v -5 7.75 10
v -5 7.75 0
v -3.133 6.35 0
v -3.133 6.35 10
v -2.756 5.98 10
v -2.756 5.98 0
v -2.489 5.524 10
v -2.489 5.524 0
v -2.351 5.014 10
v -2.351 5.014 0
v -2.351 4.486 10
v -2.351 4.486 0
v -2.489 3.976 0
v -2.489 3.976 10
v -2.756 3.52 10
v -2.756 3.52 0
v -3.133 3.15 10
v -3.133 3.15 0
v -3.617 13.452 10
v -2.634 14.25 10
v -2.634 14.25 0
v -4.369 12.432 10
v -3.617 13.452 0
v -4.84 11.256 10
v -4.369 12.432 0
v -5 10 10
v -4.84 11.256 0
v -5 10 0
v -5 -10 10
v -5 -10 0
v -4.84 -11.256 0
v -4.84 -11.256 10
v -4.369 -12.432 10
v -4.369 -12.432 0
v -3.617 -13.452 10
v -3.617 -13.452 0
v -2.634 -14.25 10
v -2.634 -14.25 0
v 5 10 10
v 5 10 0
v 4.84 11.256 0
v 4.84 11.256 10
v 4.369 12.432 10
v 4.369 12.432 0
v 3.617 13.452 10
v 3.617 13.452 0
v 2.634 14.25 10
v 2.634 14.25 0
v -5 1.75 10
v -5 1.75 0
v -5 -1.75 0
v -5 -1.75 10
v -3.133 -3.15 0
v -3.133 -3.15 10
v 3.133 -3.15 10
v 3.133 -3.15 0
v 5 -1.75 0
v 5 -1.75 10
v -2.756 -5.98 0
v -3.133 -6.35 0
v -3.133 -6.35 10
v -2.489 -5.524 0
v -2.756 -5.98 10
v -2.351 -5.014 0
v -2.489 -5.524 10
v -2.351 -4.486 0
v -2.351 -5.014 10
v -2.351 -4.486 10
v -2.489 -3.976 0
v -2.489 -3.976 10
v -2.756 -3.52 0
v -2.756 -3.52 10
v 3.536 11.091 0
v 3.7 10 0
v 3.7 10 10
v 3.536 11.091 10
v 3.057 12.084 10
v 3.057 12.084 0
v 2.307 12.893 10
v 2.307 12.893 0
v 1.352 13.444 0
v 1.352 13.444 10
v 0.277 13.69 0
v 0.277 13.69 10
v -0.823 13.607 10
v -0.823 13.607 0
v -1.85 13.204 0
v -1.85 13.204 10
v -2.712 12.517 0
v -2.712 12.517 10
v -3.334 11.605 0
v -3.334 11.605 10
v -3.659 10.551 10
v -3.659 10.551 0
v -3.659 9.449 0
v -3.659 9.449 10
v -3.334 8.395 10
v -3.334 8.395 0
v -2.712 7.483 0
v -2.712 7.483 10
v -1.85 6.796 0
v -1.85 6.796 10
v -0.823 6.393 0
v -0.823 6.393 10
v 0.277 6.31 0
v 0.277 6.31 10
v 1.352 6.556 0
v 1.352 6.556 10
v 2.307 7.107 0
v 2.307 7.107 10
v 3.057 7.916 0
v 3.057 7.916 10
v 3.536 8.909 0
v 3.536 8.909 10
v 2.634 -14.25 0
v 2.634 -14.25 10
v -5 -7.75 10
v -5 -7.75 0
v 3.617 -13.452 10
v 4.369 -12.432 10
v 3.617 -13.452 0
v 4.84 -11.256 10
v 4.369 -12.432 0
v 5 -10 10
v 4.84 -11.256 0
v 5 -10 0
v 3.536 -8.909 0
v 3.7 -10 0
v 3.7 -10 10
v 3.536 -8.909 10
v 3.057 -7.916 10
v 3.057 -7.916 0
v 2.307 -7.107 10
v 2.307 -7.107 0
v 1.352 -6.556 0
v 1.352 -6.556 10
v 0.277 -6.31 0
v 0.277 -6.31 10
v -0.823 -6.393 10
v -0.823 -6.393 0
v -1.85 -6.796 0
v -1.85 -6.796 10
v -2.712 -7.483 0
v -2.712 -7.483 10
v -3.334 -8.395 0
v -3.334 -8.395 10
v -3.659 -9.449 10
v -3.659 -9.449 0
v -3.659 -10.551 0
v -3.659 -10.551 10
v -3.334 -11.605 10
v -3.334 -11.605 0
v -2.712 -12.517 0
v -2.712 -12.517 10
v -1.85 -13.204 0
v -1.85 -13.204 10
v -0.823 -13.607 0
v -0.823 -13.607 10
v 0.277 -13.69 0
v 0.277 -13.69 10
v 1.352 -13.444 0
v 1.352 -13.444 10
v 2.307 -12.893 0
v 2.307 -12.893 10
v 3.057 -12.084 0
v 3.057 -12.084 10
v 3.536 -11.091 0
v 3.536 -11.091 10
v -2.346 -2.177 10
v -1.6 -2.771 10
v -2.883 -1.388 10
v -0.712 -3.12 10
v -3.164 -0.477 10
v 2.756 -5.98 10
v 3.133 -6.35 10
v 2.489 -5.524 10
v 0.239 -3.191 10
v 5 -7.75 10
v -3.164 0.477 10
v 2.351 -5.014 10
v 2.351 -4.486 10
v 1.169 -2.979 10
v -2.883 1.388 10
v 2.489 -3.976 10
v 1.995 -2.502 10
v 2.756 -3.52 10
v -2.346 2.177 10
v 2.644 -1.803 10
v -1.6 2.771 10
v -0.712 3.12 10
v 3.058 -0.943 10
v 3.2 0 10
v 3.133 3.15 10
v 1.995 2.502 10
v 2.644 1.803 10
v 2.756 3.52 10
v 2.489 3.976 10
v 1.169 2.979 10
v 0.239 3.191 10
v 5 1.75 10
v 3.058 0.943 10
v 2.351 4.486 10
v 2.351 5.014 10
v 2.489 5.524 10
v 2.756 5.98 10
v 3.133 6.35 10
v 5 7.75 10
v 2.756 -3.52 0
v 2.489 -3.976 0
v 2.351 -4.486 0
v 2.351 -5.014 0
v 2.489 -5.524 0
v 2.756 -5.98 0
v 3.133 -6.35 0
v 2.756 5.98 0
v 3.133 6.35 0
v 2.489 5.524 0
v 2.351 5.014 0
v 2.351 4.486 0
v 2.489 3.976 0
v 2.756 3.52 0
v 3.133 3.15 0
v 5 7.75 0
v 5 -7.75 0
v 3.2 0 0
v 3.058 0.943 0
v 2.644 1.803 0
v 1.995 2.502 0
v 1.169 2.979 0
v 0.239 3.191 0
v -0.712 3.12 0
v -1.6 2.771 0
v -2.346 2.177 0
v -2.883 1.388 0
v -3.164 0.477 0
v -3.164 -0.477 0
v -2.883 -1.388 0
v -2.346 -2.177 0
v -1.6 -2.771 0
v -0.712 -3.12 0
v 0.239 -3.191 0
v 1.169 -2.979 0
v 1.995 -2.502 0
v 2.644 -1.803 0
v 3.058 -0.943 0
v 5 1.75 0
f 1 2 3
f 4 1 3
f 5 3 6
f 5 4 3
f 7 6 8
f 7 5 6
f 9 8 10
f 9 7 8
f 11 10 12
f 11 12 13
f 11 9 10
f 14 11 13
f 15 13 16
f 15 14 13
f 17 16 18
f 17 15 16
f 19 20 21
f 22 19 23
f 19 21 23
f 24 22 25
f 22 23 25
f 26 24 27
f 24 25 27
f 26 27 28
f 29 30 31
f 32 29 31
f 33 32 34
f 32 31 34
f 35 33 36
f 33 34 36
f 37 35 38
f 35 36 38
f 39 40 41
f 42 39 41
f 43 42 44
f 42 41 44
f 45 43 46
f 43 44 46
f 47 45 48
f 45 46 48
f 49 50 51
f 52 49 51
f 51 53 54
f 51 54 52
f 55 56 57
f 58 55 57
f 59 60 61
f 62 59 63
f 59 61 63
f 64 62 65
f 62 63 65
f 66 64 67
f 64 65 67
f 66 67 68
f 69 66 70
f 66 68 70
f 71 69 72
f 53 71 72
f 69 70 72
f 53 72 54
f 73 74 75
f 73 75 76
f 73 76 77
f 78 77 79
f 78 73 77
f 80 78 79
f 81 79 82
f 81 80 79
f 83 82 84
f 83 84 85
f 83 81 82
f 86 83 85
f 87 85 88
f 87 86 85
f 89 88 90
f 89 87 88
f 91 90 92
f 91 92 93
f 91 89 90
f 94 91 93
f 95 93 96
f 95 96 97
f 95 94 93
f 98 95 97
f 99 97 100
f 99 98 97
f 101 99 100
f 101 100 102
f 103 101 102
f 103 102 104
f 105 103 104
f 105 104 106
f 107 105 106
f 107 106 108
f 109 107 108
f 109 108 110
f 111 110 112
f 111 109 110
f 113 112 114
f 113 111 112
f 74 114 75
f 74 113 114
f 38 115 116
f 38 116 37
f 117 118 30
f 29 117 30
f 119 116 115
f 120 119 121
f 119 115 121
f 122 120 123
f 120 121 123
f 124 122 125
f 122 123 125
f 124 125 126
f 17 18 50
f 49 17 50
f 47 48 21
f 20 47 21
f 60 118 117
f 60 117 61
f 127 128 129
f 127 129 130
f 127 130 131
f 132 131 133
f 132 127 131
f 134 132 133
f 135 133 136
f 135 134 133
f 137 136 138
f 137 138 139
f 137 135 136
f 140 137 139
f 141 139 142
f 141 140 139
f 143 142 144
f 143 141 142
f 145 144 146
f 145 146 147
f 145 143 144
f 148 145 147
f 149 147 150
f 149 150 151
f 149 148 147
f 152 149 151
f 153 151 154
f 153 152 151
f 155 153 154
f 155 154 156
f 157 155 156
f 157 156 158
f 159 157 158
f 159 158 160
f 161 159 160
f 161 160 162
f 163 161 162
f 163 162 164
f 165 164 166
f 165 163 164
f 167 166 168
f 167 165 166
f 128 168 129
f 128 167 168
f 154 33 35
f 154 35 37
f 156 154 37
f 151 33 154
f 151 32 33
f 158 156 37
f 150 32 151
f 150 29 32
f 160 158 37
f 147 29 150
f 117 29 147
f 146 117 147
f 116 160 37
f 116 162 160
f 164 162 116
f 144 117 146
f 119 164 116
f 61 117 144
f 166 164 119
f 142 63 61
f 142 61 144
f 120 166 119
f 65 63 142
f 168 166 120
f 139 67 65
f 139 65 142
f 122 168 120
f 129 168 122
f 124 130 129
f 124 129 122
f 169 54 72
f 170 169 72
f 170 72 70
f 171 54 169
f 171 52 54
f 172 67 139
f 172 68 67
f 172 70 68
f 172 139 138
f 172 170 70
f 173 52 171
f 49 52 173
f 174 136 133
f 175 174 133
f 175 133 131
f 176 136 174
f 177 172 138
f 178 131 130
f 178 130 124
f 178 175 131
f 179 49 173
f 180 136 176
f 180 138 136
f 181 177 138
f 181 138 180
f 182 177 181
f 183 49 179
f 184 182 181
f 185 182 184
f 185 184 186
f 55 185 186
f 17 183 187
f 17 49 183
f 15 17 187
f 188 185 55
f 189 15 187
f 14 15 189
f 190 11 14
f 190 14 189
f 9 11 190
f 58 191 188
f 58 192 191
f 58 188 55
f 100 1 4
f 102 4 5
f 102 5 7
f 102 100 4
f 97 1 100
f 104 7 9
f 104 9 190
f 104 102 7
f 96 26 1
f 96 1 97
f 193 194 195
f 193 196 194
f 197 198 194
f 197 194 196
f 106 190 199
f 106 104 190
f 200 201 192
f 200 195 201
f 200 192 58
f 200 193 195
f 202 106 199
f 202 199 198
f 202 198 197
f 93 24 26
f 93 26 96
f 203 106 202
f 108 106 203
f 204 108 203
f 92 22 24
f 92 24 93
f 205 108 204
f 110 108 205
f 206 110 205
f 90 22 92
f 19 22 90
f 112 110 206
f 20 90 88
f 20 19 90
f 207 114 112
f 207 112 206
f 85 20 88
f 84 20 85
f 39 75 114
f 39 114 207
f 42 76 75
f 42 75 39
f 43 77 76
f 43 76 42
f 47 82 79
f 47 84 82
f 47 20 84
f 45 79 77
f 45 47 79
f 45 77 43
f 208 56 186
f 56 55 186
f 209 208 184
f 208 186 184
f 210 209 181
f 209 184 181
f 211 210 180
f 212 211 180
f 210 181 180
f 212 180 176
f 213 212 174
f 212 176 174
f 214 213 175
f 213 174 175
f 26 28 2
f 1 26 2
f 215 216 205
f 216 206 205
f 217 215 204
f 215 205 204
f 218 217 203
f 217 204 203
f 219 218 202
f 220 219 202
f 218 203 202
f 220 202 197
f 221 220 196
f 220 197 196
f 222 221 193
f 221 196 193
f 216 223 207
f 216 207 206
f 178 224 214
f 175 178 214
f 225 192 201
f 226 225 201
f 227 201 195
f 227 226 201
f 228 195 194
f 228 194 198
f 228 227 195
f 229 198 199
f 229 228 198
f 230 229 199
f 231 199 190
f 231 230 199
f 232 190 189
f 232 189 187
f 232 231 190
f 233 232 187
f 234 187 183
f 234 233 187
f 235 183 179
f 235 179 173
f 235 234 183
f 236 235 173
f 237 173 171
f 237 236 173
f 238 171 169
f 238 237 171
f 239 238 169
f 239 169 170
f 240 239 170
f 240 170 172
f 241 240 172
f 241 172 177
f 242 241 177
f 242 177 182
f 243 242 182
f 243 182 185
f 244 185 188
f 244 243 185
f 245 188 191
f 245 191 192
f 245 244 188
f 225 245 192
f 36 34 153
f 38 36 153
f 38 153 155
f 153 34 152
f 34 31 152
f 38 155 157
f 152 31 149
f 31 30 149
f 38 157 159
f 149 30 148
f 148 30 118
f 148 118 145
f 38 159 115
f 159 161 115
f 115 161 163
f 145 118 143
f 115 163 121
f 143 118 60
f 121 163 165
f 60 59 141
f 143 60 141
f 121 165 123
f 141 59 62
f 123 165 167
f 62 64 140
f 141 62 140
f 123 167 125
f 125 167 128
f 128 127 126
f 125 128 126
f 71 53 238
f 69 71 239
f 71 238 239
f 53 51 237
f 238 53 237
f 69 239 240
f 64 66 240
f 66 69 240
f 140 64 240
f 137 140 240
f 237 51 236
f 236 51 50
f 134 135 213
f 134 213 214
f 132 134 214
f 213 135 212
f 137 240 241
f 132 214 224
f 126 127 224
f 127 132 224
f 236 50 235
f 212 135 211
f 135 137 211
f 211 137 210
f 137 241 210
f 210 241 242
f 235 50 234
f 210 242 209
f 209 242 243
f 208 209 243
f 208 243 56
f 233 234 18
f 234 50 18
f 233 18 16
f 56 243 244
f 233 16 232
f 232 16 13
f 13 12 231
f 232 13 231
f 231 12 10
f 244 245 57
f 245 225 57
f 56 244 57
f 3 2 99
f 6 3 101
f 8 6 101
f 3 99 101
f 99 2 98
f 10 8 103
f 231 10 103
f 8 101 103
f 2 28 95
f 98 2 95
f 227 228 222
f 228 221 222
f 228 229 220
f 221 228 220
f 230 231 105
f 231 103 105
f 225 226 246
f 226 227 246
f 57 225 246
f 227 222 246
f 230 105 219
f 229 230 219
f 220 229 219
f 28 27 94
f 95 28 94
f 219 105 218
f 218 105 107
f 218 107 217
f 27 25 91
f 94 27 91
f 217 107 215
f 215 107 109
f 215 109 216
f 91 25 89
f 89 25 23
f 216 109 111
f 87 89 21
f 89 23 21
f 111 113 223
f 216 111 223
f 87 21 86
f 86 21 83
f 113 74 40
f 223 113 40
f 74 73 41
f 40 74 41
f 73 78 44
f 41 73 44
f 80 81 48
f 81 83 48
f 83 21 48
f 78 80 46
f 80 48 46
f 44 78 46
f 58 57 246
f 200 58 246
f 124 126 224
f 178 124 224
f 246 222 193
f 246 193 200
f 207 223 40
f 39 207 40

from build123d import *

# Parameters (mm, degrees)
ESQUISSE1_R             = 3.7
ESQUISSE1_R_2           = 3.2
BOSS_EXTRU_1_DEPTH      = 10
ENL_V_START             = -10
ENL_V_MAT_EXTRU_1_DEPTH = 29.708286934
SYM_TRIE2_START         = -10
SYM_TRIE2_COPY_1_DEPTH  = 29.708286934
CONG_1_R                = 2
ESQUISSE3_W             = 16.438795986
ESQUISSE3_H             = 1.5
ESQUISSE3_W_2           = 21.038627968
ENL_V_MAT_EXTRU_2_DEPTH = 19.708286934


with BuildPart() as part:
    # Esquisse1 → Boss.-Extru.1 (new body)
    with BuildSketch(Plane.XY):
        with BuildLine():
            ThreePointArc((5, 10), (0, 15), (-5, 10))
            Line((-5, 10), (-5, -10))
            ThreePointArc((-5, -10), (0, -15), (5, -10))
            Line((5, -10), (5, 10))
        make_face()
        with Locations((0, 10)):
            Circle(ESQUISSE1_R, mode=Mode.SUBTRACT)
        Circle(ESQUISSE1_R_2, mode=Mode.SUBTRACT)
        with Locations((0, -10)):
            Circle(ESQUISSE1_R, mode=Mode.SUBTRACT)
    extrude(amount=BOSS_EXTRU_1_DEPTH)

    # Esquisse2 → Enlèv. mat.-Extru.1 (cut)
    with BuildSketch(Plane.XY.offset(10).offset(ENL_V_START)):
        Polygon((52.761287706, 43.570965779), (5, 7.75), (1, 4.75), (5, 1.75), (52.761287706, -34.070965779), (172.164506969, -34.070965779), (172.164506969, 43.570965779), align=None)
    enl_v_mat_extru_1 = extrude(amount=ENL_V_MAT_EXTRU_1_DEPTH, mode=Mode.SUBTRACT)

    # Symétrie1: Enlèv. mat.-Extru.1 across plane
    add(enl_v_mat_extru_1.mirror(Plane(origin=(0, 0, 0), x_dir=(0, 0, 1), z_dir=(1, 0, 0))), mode=Mode.SUBTRACT)

    # Symétrie2: Enlèv. mat.-Extru.1 across plane
    add(enl_v_mat_extru_1.mirror(Plane.ZX), mode=Mode.SUBTRACT)

    # Symétrie2 copy 1 sketch → Symétrie2 copy 1 (cut)
    with BuildSketch(Plane(origin=(0, 0, 10), x_dir=(-1, 0, 0), z_dir=(0, 0, 1)).offset(SYM_TRIE2_START)):
        Polygon((52.761287706, 43.570965779), (5, 7.75), (1, 4.75), (5, 1.75), (52.761287706, -34.070965779), (172.164506969, -34.070965779), (172.164506969, 43.570965779), align=None)
    extrude(amount=SYM_TRIE2_COPY_1_DEPTH, mode=Mode.SUBTRACT)

    # Congé1
    cong_1_edges = [part.edges().sort_by_distance(p)[0] for p in [
        (1, 4.75, 5),
        (-1, 4.75, 5),
        (-1, -4.75, 5),
        (1, -4.75, 5),
    ]]
    fillet(cong_1_edges, radius=CONG_1_R)

    # Esquisse3 → Enlèv. mat.-Extru.2 (cut, through all)
    with BuildSketch(Plane(origin=(0, 0, 0), x_dir=(-1, 0, 0), z_dir=(0, 0, -1))):
        with Locations((0, 15)):
            Rectangle(ESQUISSE3_W, ESQUISSE3_H)
        with Locations((0, -15)):
            Rectangle(ESQUISSE3_W_2, ESQUISSE3_H)
    extrude(amount=-ENL_V_MAT_EXTRU_2_DEPTH, mode=Mode.SUBTRACT)


solid = part.part
